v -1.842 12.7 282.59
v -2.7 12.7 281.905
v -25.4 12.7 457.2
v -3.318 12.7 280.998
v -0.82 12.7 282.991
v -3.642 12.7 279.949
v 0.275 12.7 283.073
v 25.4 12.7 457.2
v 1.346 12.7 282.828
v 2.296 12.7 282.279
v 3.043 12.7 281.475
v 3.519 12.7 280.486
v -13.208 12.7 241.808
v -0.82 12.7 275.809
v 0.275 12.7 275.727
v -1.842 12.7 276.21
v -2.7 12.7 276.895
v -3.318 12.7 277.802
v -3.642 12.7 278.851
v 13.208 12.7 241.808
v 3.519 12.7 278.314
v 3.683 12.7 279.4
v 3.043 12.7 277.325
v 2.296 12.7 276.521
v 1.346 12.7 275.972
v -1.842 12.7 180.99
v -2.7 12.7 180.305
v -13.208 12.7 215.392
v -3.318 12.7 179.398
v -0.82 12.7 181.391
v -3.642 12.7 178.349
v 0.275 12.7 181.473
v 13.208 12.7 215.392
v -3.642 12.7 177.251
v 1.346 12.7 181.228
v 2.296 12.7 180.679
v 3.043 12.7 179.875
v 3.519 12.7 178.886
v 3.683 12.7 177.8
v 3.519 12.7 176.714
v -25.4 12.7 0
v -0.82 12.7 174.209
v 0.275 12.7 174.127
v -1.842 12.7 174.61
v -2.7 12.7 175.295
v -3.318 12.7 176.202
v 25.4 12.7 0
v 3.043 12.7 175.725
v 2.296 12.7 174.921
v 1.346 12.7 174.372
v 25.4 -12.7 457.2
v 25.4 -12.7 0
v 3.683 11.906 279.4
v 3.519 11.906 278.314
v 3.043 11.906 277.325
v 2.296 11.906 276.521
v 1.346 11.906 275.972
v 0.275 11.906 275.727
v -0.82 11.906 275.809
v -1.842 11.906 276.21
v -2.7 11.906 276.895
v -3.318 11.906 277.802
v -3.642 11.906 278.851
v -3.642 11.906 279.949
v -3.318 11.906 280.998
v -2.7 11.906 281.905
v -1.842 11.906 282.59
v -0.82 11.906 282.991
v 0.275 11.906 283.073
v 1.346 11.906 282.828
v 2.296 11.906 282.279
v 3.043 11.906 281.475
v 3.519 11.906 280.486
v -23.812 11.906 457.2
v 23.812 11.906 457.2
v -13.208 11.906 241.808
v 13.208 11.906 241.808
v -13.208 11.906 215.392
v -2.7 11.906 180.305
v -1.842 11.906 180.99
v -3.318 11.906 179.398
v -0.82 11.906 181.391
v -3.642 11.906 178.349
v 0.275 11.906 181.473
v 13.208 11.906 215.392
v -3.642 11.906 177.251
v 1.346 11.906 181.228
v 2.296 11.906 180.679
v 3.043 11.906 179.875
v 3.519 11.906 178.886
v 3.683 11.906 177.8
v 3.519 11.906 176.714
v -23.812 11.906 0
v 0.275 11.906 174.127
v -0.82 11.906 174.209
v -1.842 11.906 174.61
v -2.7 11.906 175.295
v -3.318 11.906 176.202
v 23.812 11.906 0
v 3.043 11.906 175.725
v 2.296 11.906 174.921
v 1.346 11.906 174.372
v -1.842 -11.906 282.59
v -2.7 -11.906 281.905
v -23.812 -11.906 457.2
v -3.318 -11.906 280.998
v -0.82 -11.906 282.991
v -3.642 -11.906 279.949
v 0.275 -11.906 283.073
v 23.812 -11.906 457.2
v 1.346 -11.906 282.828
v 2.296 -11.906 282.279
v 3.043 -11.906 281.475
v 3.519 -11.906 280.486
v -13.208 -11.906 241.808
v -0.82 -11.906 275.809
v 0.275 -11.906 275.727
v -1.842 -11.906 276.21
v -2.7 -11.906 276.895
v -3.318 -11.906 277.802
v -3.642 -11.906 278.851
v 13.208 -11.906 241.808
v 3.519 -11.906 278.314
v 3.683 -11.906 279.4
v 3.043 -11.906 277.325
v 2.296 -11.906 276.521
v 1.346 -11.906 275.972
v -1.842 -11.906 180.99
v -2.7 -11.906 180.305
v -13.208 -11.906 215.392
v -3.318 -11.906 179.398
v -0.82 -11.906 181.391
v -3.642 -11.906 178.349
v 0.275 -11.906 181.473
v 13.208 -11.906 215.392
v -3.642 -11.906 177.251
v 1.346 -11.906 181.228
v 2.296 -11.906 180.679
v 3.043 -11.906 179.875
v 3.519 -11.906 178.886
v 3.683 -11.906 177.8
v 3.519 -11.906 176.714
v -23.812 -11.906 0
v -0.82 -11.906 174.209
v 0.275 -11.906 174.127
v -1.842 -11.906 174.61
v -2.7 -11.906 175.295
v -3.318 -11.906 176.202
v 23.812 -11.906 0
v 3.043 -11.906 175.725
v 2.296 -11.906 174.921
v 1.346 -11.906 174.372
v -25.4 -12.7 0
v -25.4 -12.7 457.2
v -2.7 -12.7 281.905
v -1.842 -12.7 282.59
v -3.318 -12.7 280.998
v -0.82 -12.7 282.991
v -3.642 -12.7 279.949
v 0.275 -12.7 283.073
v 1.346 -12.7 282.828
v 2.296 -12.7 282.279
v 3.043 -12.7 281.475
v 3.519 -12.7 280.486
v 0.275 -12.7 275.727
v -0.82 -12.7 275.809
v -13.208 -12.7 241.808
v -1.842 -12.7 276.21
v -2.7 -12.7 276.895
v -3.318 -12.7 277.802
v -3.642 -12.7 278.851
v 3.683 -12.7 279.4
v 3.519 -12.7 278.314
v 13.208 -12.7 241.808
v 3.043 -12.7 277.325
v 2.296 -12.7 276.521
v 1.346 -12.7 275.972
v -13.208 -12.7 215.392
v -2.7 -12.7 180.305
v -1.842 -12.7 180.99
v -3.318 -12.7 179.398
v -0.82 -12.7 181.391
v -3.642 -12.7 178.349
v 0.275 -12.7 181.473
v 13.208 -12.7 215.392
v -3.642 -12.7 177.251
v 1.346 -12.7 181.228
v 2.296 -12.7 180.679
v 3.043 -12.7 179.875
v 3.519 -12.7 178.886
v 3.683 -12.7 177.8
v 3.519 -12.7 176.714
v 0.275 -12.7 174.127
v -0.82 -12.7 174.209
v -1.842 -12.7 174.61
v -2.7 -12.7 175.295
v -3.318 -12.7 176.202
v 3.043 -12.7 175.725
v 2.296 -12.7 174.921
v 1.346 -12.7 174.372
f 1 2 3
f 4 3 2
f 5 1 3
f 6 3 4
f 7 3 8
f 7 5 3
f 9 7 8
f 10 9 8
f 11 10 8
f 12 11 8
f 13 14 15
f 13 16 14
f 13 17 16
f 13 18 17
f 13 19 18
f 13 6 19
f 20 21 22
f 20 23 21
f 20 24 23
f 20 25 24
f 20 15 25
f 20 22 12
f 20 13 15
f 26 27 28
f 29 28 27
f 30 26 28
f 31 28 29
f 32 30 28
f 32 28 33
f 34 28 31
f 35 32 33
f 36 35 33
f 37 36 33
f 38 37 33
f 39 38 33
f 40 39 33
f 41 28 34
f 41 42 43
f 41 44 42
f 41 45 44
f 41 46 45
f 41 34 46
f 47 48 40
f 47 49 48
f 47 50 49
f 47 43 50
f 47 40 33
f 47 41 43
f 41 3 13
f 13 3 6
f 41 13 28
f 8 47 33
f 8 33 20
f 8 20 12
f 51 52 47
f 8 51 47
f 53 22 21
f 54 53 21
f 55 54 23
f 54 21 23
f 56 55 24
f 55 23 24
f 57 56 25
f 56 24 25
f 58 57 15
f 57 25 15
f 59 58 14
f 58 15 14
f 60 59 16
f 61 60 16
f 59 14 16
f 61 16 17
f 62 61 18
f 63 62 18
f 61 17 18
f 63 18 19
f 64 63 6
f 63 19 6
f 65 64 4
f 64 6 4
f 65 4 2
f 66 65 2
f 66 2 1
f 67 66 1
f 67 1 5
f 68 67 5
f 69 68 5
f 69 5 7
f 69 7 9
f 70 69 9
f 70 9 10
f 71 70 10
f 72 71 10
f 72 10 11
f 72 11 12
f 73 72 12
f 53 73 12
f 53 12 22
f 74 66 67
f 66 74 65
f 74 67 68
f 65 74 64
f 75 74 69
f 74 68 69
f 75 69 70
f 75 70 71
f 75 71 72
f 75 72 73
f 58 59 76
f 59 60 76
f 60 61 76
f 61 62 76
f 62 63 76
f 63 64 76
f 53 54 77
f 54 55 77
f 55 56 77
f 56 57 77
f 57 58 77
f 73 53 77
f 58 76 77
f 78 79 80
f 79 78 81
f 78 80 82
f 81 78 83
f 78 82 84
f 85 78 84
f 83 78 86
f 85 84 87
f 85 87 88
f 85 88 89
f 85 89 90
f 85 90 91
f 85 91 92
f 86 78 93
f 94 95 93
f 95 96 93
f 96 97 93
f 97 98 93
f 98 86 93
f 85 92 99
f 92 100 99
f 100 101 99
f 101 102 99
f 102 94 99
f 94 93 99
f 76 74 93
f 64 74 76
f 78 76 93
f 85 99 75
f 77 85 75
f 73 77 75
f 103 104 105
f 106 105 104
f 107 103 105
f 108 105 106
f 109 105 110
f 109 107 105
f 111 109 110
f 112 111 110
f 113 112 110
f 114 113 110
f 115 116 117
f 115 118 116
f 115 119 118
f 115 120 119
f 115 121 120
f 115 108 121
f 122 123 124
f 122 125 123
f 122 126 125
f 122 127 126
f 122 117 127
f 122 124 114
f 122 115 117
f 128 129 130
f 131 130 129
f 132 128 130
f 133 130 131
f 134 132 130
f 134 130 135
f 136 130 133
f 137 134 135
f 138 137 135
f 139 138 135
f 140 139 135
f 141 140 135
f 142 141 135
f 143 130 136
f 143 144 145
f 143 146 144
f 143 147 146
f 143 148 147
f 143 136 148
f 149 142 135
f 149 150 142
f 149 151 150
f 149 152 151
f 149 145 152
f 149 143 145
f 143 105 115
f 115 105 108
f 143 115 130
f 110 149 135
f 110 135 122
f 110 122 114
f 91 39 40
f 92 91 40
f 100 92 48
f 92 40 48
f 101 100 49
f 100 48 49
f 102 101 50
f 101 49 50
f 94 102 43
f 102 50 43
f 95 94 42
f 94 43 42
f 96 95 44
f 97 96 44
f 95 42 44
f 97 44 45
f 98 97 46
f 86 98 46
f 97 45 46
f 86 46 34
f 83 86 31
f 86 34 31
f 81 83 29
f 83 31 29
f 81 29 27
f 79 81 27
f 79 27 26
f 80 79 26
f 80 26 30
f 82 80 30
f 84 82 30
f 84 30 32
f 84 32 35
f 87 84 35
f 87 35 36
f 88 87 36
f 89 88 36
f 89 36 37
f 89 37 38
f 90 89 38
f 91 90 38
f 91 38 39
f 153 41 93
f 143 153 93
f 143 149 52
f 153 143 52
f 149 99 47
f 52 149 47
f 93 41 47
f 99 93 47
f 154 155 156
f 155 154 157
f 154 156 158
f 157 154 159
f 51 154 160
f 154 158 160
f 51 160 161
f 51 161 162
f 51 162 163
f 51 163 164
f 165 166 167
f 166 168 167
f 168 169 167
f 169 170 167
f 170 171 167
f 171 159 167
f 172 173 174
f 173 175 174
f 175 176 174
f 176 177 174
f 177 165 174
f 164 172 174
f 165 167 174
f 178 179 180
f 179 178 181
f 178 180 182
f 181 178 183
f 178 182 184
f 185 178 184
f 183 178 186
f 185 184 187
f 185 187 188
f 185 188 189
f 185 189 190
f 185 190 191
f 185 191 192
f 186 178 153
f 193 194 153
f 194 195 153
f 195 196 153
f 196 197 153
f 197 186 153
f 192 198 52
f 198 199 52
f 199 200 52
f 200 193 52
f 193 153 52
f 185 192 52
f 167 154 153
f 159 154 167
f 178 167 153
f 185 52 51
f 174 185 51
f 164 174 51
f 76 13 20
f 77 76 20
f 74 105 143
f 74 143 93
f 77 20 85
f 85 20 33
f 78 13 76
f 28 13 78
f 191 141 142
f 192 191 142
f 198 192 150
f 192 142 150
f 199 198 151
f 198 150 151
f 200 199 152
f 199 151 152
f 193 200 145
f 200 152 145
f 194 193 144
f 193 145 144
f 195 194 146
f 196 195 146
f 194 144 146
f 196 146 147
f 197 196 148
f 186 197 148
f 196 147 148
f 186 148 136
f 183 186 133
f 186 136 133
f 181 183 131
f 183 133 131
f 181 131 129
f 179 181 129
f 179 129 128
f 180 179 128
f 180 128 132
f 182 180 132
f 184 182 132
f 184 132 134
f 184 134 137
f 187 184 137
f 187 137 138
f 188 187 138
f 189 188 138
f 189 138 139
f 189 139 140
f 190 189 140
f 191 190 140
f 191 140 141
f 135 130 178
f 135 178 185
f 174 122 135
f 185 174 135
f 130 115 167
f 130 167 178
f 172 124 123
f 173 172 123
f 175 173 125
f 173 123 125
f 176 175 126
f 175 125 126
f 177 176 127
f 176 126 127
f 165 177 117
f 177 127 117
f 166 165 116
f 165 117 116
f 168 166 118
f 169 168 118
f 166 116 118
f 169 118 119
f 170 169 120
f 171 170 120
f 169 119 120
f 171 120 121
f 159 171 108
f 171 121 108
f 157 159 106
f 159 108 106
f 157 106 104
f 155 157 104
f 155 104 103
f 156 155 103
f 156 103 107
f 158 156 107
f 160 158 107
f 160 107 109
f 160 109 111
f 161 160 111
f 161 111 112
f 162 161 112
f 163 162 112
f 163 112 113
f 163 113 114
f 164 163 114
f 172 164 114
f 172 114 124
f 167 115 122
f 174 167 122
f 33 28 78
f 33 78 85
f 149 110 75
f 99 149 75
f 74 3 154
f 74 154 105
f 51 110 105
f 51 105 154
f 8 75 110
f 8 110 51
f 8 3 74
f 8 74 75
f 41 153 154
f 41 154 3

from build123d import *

# Parameters (mm, degrees)
SKETCH1_W           = 50.8
SKETCH1_H           = 25.4
SKETCH1_W_2         = 47.625
SKETCH1_H_2         = 23.8125
BOSS_EXTRUDE1_DEPTH = 457.2
SKETCH2_R           = 3.683
SKETCH2_W           = 26.416
SKETCH2_H           = 26.416
CUT_EXTRUDE1_DEPTH  = 26.4


with BuildPart() as part:
    # Sketch1 → Boss-Extrude1 (new body)
    with BuildSketch(Plane.XY):
        Rectangle(SKETCH1_W, SKETCH1_H)
        Rectangle(SKETCH1_W_2, SKETCH1_H_2, mode=Mode.SUBTRACT)
    extrude(amount=BOSS_EXTRUDE1_DEPTH)

    # Sketch2 → Cut-Extrude1 (cut, through all)
    with BuildSketch(Plane(origin=(0, 12.7, 0), x_dir=(1, 0, 0), z_dir=(0, 1, 0))):
        with Locations((0, -177.8)):
            Circle(SKETCH2_R)
        with Locations((0, -279.4)):
            Circle(SKETCH2_R)
        with Locations((0, -228.6)):
            Rectangle(SKETCH2_W, SKETCH2_H)
    extrude(amount=-CUT_EXTRUDE1_DEPTH, mode=Mode.SUBTRACT)


solid = part.part
